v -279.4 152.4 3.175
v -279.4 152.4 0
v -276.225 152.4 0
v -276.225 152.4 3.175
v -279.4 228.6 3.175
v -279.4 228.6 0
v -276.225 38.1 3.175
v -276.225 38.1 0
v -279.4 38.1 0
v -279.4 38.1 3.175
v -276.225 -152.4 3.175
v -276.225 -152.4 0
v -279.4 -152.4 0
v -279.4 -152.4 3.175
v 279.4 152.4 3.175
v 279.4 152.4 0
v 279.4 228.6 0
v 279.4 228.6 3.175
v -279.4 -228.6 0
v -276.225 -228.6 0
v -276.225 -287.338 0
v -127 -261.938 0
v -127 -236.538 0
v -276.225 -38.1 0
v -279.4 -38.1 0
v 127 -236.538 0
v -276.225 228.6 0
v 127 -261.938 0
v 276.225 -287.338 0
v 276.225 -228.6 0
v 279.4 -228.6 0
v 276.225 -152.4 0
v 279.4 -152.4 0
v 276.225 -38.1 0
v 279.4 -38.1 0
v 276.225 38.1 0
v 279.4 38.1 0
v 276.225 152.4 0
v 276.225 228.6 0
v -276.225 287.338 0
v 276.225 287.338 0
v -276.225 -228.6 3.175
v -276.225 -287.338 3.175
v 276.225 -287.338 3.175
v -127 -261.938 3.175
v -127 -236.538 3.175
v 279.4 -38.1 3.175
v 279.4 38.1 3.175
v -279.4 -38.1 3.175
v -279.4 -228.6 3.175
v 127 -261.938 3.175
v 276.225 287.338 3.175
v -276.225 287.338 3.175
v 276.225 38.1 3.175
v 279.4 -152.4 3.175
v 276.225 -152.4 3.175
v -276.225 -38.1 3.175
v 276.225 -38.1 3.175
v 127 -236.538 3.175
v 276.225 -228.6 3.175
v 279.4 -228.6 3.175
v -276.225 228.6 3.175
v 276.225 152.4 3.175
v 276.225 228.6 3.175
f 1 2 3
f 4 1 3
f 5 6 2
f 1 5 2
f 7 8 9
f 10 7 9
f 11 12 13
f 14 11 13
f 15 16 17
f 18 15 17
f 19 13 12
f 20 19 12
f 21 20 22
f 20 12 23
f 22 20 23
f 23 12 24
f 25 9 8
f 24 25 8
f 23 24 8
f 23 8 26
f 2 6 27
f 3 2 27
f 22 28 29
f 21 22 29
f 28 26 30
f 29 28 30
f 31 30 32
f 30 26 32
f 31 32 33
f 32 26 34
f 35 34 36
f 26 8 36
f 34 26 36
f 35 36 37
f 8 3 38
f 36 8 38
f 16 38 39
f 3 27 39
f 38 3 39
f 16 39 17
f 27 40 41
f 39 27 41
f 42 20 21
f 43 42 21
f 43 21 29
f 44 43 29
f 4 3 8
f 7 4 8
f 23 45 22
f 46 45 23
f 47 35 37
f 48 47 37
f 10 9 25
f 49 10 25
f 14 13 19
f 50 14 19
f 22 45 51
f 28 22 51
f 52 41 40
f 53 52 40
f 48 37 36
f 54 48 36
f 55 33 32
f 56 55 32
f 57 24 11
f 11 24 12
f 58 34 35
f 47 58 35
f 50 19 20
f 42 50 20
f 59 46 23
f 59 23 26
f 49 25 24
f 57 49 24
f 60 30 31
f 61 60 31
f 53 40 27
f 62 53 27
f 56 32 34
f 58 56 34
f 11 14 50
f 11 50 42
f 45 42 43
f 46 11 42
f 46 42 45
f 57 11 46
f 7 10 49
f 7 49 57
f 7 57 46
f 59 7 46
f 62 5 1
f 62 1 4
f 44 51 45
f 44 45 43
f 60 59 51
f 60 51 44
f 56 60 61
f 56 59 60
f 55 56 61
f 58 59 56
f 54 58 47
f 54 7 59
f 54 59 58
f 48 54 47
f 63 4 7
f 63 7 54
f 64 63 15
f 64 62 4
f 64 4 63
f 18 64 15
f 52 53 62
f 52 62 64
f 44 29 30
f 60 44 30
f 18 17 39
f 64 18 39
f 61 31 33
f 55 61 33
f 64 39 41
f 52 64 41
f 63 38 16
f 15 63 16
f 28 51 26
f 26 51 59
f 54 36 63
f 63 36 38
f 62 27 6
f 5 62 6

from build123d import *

# Parameters (mm, degrees)
F1_DEPTH = 3.175
F2_W     = 254
F2_H     = 25.4
F3_DEPTH = 3.176


with BuildPart() as f1:
    # F0 (on Top) → F1 (new body)
    with BuildSketch(Plane.XY):
        Polygon((-276.225, -287.3375), (276.225, -287.3375), (276.225, -228.6), (279.4, -228.6), (279.4, -152.4), (276.225, -152.4), (276.225, -38.1), (279.4, -38.1), (279.4, 38.1), (276.225, 38.1), (276.225, 152.4), (279.4, 152.4), (279.4, 228.6), (276.225, 228.6), (276.225, 287.3375), (-276.225, 287.3375), (-276.225, 228.6), (-279.4, 228.6), (-279.4, 152.4), (-276.225, 152.4), (-276.225, 38.1), (-279.4, 38.1), (-279.4, -38.1), (-276.225, -38.1), (-276.225, -152.4), (-279.4, -152.4), (-279.4, -228.6), (-276.225, -228.6), align=None)
    extrude(amount=F1_DEPTH)

    # F2 (on face) → F3 (cut, through all)
    with BuildSketch(Plane.XY.offset(3.175)):
        with Locations((0, -249.2375)):
            Rectangle(F2_W, F2_H)
    extrude(amount=-F3_DEPTH, mode=Mode.SUBTRACT)


solid = f1.part
